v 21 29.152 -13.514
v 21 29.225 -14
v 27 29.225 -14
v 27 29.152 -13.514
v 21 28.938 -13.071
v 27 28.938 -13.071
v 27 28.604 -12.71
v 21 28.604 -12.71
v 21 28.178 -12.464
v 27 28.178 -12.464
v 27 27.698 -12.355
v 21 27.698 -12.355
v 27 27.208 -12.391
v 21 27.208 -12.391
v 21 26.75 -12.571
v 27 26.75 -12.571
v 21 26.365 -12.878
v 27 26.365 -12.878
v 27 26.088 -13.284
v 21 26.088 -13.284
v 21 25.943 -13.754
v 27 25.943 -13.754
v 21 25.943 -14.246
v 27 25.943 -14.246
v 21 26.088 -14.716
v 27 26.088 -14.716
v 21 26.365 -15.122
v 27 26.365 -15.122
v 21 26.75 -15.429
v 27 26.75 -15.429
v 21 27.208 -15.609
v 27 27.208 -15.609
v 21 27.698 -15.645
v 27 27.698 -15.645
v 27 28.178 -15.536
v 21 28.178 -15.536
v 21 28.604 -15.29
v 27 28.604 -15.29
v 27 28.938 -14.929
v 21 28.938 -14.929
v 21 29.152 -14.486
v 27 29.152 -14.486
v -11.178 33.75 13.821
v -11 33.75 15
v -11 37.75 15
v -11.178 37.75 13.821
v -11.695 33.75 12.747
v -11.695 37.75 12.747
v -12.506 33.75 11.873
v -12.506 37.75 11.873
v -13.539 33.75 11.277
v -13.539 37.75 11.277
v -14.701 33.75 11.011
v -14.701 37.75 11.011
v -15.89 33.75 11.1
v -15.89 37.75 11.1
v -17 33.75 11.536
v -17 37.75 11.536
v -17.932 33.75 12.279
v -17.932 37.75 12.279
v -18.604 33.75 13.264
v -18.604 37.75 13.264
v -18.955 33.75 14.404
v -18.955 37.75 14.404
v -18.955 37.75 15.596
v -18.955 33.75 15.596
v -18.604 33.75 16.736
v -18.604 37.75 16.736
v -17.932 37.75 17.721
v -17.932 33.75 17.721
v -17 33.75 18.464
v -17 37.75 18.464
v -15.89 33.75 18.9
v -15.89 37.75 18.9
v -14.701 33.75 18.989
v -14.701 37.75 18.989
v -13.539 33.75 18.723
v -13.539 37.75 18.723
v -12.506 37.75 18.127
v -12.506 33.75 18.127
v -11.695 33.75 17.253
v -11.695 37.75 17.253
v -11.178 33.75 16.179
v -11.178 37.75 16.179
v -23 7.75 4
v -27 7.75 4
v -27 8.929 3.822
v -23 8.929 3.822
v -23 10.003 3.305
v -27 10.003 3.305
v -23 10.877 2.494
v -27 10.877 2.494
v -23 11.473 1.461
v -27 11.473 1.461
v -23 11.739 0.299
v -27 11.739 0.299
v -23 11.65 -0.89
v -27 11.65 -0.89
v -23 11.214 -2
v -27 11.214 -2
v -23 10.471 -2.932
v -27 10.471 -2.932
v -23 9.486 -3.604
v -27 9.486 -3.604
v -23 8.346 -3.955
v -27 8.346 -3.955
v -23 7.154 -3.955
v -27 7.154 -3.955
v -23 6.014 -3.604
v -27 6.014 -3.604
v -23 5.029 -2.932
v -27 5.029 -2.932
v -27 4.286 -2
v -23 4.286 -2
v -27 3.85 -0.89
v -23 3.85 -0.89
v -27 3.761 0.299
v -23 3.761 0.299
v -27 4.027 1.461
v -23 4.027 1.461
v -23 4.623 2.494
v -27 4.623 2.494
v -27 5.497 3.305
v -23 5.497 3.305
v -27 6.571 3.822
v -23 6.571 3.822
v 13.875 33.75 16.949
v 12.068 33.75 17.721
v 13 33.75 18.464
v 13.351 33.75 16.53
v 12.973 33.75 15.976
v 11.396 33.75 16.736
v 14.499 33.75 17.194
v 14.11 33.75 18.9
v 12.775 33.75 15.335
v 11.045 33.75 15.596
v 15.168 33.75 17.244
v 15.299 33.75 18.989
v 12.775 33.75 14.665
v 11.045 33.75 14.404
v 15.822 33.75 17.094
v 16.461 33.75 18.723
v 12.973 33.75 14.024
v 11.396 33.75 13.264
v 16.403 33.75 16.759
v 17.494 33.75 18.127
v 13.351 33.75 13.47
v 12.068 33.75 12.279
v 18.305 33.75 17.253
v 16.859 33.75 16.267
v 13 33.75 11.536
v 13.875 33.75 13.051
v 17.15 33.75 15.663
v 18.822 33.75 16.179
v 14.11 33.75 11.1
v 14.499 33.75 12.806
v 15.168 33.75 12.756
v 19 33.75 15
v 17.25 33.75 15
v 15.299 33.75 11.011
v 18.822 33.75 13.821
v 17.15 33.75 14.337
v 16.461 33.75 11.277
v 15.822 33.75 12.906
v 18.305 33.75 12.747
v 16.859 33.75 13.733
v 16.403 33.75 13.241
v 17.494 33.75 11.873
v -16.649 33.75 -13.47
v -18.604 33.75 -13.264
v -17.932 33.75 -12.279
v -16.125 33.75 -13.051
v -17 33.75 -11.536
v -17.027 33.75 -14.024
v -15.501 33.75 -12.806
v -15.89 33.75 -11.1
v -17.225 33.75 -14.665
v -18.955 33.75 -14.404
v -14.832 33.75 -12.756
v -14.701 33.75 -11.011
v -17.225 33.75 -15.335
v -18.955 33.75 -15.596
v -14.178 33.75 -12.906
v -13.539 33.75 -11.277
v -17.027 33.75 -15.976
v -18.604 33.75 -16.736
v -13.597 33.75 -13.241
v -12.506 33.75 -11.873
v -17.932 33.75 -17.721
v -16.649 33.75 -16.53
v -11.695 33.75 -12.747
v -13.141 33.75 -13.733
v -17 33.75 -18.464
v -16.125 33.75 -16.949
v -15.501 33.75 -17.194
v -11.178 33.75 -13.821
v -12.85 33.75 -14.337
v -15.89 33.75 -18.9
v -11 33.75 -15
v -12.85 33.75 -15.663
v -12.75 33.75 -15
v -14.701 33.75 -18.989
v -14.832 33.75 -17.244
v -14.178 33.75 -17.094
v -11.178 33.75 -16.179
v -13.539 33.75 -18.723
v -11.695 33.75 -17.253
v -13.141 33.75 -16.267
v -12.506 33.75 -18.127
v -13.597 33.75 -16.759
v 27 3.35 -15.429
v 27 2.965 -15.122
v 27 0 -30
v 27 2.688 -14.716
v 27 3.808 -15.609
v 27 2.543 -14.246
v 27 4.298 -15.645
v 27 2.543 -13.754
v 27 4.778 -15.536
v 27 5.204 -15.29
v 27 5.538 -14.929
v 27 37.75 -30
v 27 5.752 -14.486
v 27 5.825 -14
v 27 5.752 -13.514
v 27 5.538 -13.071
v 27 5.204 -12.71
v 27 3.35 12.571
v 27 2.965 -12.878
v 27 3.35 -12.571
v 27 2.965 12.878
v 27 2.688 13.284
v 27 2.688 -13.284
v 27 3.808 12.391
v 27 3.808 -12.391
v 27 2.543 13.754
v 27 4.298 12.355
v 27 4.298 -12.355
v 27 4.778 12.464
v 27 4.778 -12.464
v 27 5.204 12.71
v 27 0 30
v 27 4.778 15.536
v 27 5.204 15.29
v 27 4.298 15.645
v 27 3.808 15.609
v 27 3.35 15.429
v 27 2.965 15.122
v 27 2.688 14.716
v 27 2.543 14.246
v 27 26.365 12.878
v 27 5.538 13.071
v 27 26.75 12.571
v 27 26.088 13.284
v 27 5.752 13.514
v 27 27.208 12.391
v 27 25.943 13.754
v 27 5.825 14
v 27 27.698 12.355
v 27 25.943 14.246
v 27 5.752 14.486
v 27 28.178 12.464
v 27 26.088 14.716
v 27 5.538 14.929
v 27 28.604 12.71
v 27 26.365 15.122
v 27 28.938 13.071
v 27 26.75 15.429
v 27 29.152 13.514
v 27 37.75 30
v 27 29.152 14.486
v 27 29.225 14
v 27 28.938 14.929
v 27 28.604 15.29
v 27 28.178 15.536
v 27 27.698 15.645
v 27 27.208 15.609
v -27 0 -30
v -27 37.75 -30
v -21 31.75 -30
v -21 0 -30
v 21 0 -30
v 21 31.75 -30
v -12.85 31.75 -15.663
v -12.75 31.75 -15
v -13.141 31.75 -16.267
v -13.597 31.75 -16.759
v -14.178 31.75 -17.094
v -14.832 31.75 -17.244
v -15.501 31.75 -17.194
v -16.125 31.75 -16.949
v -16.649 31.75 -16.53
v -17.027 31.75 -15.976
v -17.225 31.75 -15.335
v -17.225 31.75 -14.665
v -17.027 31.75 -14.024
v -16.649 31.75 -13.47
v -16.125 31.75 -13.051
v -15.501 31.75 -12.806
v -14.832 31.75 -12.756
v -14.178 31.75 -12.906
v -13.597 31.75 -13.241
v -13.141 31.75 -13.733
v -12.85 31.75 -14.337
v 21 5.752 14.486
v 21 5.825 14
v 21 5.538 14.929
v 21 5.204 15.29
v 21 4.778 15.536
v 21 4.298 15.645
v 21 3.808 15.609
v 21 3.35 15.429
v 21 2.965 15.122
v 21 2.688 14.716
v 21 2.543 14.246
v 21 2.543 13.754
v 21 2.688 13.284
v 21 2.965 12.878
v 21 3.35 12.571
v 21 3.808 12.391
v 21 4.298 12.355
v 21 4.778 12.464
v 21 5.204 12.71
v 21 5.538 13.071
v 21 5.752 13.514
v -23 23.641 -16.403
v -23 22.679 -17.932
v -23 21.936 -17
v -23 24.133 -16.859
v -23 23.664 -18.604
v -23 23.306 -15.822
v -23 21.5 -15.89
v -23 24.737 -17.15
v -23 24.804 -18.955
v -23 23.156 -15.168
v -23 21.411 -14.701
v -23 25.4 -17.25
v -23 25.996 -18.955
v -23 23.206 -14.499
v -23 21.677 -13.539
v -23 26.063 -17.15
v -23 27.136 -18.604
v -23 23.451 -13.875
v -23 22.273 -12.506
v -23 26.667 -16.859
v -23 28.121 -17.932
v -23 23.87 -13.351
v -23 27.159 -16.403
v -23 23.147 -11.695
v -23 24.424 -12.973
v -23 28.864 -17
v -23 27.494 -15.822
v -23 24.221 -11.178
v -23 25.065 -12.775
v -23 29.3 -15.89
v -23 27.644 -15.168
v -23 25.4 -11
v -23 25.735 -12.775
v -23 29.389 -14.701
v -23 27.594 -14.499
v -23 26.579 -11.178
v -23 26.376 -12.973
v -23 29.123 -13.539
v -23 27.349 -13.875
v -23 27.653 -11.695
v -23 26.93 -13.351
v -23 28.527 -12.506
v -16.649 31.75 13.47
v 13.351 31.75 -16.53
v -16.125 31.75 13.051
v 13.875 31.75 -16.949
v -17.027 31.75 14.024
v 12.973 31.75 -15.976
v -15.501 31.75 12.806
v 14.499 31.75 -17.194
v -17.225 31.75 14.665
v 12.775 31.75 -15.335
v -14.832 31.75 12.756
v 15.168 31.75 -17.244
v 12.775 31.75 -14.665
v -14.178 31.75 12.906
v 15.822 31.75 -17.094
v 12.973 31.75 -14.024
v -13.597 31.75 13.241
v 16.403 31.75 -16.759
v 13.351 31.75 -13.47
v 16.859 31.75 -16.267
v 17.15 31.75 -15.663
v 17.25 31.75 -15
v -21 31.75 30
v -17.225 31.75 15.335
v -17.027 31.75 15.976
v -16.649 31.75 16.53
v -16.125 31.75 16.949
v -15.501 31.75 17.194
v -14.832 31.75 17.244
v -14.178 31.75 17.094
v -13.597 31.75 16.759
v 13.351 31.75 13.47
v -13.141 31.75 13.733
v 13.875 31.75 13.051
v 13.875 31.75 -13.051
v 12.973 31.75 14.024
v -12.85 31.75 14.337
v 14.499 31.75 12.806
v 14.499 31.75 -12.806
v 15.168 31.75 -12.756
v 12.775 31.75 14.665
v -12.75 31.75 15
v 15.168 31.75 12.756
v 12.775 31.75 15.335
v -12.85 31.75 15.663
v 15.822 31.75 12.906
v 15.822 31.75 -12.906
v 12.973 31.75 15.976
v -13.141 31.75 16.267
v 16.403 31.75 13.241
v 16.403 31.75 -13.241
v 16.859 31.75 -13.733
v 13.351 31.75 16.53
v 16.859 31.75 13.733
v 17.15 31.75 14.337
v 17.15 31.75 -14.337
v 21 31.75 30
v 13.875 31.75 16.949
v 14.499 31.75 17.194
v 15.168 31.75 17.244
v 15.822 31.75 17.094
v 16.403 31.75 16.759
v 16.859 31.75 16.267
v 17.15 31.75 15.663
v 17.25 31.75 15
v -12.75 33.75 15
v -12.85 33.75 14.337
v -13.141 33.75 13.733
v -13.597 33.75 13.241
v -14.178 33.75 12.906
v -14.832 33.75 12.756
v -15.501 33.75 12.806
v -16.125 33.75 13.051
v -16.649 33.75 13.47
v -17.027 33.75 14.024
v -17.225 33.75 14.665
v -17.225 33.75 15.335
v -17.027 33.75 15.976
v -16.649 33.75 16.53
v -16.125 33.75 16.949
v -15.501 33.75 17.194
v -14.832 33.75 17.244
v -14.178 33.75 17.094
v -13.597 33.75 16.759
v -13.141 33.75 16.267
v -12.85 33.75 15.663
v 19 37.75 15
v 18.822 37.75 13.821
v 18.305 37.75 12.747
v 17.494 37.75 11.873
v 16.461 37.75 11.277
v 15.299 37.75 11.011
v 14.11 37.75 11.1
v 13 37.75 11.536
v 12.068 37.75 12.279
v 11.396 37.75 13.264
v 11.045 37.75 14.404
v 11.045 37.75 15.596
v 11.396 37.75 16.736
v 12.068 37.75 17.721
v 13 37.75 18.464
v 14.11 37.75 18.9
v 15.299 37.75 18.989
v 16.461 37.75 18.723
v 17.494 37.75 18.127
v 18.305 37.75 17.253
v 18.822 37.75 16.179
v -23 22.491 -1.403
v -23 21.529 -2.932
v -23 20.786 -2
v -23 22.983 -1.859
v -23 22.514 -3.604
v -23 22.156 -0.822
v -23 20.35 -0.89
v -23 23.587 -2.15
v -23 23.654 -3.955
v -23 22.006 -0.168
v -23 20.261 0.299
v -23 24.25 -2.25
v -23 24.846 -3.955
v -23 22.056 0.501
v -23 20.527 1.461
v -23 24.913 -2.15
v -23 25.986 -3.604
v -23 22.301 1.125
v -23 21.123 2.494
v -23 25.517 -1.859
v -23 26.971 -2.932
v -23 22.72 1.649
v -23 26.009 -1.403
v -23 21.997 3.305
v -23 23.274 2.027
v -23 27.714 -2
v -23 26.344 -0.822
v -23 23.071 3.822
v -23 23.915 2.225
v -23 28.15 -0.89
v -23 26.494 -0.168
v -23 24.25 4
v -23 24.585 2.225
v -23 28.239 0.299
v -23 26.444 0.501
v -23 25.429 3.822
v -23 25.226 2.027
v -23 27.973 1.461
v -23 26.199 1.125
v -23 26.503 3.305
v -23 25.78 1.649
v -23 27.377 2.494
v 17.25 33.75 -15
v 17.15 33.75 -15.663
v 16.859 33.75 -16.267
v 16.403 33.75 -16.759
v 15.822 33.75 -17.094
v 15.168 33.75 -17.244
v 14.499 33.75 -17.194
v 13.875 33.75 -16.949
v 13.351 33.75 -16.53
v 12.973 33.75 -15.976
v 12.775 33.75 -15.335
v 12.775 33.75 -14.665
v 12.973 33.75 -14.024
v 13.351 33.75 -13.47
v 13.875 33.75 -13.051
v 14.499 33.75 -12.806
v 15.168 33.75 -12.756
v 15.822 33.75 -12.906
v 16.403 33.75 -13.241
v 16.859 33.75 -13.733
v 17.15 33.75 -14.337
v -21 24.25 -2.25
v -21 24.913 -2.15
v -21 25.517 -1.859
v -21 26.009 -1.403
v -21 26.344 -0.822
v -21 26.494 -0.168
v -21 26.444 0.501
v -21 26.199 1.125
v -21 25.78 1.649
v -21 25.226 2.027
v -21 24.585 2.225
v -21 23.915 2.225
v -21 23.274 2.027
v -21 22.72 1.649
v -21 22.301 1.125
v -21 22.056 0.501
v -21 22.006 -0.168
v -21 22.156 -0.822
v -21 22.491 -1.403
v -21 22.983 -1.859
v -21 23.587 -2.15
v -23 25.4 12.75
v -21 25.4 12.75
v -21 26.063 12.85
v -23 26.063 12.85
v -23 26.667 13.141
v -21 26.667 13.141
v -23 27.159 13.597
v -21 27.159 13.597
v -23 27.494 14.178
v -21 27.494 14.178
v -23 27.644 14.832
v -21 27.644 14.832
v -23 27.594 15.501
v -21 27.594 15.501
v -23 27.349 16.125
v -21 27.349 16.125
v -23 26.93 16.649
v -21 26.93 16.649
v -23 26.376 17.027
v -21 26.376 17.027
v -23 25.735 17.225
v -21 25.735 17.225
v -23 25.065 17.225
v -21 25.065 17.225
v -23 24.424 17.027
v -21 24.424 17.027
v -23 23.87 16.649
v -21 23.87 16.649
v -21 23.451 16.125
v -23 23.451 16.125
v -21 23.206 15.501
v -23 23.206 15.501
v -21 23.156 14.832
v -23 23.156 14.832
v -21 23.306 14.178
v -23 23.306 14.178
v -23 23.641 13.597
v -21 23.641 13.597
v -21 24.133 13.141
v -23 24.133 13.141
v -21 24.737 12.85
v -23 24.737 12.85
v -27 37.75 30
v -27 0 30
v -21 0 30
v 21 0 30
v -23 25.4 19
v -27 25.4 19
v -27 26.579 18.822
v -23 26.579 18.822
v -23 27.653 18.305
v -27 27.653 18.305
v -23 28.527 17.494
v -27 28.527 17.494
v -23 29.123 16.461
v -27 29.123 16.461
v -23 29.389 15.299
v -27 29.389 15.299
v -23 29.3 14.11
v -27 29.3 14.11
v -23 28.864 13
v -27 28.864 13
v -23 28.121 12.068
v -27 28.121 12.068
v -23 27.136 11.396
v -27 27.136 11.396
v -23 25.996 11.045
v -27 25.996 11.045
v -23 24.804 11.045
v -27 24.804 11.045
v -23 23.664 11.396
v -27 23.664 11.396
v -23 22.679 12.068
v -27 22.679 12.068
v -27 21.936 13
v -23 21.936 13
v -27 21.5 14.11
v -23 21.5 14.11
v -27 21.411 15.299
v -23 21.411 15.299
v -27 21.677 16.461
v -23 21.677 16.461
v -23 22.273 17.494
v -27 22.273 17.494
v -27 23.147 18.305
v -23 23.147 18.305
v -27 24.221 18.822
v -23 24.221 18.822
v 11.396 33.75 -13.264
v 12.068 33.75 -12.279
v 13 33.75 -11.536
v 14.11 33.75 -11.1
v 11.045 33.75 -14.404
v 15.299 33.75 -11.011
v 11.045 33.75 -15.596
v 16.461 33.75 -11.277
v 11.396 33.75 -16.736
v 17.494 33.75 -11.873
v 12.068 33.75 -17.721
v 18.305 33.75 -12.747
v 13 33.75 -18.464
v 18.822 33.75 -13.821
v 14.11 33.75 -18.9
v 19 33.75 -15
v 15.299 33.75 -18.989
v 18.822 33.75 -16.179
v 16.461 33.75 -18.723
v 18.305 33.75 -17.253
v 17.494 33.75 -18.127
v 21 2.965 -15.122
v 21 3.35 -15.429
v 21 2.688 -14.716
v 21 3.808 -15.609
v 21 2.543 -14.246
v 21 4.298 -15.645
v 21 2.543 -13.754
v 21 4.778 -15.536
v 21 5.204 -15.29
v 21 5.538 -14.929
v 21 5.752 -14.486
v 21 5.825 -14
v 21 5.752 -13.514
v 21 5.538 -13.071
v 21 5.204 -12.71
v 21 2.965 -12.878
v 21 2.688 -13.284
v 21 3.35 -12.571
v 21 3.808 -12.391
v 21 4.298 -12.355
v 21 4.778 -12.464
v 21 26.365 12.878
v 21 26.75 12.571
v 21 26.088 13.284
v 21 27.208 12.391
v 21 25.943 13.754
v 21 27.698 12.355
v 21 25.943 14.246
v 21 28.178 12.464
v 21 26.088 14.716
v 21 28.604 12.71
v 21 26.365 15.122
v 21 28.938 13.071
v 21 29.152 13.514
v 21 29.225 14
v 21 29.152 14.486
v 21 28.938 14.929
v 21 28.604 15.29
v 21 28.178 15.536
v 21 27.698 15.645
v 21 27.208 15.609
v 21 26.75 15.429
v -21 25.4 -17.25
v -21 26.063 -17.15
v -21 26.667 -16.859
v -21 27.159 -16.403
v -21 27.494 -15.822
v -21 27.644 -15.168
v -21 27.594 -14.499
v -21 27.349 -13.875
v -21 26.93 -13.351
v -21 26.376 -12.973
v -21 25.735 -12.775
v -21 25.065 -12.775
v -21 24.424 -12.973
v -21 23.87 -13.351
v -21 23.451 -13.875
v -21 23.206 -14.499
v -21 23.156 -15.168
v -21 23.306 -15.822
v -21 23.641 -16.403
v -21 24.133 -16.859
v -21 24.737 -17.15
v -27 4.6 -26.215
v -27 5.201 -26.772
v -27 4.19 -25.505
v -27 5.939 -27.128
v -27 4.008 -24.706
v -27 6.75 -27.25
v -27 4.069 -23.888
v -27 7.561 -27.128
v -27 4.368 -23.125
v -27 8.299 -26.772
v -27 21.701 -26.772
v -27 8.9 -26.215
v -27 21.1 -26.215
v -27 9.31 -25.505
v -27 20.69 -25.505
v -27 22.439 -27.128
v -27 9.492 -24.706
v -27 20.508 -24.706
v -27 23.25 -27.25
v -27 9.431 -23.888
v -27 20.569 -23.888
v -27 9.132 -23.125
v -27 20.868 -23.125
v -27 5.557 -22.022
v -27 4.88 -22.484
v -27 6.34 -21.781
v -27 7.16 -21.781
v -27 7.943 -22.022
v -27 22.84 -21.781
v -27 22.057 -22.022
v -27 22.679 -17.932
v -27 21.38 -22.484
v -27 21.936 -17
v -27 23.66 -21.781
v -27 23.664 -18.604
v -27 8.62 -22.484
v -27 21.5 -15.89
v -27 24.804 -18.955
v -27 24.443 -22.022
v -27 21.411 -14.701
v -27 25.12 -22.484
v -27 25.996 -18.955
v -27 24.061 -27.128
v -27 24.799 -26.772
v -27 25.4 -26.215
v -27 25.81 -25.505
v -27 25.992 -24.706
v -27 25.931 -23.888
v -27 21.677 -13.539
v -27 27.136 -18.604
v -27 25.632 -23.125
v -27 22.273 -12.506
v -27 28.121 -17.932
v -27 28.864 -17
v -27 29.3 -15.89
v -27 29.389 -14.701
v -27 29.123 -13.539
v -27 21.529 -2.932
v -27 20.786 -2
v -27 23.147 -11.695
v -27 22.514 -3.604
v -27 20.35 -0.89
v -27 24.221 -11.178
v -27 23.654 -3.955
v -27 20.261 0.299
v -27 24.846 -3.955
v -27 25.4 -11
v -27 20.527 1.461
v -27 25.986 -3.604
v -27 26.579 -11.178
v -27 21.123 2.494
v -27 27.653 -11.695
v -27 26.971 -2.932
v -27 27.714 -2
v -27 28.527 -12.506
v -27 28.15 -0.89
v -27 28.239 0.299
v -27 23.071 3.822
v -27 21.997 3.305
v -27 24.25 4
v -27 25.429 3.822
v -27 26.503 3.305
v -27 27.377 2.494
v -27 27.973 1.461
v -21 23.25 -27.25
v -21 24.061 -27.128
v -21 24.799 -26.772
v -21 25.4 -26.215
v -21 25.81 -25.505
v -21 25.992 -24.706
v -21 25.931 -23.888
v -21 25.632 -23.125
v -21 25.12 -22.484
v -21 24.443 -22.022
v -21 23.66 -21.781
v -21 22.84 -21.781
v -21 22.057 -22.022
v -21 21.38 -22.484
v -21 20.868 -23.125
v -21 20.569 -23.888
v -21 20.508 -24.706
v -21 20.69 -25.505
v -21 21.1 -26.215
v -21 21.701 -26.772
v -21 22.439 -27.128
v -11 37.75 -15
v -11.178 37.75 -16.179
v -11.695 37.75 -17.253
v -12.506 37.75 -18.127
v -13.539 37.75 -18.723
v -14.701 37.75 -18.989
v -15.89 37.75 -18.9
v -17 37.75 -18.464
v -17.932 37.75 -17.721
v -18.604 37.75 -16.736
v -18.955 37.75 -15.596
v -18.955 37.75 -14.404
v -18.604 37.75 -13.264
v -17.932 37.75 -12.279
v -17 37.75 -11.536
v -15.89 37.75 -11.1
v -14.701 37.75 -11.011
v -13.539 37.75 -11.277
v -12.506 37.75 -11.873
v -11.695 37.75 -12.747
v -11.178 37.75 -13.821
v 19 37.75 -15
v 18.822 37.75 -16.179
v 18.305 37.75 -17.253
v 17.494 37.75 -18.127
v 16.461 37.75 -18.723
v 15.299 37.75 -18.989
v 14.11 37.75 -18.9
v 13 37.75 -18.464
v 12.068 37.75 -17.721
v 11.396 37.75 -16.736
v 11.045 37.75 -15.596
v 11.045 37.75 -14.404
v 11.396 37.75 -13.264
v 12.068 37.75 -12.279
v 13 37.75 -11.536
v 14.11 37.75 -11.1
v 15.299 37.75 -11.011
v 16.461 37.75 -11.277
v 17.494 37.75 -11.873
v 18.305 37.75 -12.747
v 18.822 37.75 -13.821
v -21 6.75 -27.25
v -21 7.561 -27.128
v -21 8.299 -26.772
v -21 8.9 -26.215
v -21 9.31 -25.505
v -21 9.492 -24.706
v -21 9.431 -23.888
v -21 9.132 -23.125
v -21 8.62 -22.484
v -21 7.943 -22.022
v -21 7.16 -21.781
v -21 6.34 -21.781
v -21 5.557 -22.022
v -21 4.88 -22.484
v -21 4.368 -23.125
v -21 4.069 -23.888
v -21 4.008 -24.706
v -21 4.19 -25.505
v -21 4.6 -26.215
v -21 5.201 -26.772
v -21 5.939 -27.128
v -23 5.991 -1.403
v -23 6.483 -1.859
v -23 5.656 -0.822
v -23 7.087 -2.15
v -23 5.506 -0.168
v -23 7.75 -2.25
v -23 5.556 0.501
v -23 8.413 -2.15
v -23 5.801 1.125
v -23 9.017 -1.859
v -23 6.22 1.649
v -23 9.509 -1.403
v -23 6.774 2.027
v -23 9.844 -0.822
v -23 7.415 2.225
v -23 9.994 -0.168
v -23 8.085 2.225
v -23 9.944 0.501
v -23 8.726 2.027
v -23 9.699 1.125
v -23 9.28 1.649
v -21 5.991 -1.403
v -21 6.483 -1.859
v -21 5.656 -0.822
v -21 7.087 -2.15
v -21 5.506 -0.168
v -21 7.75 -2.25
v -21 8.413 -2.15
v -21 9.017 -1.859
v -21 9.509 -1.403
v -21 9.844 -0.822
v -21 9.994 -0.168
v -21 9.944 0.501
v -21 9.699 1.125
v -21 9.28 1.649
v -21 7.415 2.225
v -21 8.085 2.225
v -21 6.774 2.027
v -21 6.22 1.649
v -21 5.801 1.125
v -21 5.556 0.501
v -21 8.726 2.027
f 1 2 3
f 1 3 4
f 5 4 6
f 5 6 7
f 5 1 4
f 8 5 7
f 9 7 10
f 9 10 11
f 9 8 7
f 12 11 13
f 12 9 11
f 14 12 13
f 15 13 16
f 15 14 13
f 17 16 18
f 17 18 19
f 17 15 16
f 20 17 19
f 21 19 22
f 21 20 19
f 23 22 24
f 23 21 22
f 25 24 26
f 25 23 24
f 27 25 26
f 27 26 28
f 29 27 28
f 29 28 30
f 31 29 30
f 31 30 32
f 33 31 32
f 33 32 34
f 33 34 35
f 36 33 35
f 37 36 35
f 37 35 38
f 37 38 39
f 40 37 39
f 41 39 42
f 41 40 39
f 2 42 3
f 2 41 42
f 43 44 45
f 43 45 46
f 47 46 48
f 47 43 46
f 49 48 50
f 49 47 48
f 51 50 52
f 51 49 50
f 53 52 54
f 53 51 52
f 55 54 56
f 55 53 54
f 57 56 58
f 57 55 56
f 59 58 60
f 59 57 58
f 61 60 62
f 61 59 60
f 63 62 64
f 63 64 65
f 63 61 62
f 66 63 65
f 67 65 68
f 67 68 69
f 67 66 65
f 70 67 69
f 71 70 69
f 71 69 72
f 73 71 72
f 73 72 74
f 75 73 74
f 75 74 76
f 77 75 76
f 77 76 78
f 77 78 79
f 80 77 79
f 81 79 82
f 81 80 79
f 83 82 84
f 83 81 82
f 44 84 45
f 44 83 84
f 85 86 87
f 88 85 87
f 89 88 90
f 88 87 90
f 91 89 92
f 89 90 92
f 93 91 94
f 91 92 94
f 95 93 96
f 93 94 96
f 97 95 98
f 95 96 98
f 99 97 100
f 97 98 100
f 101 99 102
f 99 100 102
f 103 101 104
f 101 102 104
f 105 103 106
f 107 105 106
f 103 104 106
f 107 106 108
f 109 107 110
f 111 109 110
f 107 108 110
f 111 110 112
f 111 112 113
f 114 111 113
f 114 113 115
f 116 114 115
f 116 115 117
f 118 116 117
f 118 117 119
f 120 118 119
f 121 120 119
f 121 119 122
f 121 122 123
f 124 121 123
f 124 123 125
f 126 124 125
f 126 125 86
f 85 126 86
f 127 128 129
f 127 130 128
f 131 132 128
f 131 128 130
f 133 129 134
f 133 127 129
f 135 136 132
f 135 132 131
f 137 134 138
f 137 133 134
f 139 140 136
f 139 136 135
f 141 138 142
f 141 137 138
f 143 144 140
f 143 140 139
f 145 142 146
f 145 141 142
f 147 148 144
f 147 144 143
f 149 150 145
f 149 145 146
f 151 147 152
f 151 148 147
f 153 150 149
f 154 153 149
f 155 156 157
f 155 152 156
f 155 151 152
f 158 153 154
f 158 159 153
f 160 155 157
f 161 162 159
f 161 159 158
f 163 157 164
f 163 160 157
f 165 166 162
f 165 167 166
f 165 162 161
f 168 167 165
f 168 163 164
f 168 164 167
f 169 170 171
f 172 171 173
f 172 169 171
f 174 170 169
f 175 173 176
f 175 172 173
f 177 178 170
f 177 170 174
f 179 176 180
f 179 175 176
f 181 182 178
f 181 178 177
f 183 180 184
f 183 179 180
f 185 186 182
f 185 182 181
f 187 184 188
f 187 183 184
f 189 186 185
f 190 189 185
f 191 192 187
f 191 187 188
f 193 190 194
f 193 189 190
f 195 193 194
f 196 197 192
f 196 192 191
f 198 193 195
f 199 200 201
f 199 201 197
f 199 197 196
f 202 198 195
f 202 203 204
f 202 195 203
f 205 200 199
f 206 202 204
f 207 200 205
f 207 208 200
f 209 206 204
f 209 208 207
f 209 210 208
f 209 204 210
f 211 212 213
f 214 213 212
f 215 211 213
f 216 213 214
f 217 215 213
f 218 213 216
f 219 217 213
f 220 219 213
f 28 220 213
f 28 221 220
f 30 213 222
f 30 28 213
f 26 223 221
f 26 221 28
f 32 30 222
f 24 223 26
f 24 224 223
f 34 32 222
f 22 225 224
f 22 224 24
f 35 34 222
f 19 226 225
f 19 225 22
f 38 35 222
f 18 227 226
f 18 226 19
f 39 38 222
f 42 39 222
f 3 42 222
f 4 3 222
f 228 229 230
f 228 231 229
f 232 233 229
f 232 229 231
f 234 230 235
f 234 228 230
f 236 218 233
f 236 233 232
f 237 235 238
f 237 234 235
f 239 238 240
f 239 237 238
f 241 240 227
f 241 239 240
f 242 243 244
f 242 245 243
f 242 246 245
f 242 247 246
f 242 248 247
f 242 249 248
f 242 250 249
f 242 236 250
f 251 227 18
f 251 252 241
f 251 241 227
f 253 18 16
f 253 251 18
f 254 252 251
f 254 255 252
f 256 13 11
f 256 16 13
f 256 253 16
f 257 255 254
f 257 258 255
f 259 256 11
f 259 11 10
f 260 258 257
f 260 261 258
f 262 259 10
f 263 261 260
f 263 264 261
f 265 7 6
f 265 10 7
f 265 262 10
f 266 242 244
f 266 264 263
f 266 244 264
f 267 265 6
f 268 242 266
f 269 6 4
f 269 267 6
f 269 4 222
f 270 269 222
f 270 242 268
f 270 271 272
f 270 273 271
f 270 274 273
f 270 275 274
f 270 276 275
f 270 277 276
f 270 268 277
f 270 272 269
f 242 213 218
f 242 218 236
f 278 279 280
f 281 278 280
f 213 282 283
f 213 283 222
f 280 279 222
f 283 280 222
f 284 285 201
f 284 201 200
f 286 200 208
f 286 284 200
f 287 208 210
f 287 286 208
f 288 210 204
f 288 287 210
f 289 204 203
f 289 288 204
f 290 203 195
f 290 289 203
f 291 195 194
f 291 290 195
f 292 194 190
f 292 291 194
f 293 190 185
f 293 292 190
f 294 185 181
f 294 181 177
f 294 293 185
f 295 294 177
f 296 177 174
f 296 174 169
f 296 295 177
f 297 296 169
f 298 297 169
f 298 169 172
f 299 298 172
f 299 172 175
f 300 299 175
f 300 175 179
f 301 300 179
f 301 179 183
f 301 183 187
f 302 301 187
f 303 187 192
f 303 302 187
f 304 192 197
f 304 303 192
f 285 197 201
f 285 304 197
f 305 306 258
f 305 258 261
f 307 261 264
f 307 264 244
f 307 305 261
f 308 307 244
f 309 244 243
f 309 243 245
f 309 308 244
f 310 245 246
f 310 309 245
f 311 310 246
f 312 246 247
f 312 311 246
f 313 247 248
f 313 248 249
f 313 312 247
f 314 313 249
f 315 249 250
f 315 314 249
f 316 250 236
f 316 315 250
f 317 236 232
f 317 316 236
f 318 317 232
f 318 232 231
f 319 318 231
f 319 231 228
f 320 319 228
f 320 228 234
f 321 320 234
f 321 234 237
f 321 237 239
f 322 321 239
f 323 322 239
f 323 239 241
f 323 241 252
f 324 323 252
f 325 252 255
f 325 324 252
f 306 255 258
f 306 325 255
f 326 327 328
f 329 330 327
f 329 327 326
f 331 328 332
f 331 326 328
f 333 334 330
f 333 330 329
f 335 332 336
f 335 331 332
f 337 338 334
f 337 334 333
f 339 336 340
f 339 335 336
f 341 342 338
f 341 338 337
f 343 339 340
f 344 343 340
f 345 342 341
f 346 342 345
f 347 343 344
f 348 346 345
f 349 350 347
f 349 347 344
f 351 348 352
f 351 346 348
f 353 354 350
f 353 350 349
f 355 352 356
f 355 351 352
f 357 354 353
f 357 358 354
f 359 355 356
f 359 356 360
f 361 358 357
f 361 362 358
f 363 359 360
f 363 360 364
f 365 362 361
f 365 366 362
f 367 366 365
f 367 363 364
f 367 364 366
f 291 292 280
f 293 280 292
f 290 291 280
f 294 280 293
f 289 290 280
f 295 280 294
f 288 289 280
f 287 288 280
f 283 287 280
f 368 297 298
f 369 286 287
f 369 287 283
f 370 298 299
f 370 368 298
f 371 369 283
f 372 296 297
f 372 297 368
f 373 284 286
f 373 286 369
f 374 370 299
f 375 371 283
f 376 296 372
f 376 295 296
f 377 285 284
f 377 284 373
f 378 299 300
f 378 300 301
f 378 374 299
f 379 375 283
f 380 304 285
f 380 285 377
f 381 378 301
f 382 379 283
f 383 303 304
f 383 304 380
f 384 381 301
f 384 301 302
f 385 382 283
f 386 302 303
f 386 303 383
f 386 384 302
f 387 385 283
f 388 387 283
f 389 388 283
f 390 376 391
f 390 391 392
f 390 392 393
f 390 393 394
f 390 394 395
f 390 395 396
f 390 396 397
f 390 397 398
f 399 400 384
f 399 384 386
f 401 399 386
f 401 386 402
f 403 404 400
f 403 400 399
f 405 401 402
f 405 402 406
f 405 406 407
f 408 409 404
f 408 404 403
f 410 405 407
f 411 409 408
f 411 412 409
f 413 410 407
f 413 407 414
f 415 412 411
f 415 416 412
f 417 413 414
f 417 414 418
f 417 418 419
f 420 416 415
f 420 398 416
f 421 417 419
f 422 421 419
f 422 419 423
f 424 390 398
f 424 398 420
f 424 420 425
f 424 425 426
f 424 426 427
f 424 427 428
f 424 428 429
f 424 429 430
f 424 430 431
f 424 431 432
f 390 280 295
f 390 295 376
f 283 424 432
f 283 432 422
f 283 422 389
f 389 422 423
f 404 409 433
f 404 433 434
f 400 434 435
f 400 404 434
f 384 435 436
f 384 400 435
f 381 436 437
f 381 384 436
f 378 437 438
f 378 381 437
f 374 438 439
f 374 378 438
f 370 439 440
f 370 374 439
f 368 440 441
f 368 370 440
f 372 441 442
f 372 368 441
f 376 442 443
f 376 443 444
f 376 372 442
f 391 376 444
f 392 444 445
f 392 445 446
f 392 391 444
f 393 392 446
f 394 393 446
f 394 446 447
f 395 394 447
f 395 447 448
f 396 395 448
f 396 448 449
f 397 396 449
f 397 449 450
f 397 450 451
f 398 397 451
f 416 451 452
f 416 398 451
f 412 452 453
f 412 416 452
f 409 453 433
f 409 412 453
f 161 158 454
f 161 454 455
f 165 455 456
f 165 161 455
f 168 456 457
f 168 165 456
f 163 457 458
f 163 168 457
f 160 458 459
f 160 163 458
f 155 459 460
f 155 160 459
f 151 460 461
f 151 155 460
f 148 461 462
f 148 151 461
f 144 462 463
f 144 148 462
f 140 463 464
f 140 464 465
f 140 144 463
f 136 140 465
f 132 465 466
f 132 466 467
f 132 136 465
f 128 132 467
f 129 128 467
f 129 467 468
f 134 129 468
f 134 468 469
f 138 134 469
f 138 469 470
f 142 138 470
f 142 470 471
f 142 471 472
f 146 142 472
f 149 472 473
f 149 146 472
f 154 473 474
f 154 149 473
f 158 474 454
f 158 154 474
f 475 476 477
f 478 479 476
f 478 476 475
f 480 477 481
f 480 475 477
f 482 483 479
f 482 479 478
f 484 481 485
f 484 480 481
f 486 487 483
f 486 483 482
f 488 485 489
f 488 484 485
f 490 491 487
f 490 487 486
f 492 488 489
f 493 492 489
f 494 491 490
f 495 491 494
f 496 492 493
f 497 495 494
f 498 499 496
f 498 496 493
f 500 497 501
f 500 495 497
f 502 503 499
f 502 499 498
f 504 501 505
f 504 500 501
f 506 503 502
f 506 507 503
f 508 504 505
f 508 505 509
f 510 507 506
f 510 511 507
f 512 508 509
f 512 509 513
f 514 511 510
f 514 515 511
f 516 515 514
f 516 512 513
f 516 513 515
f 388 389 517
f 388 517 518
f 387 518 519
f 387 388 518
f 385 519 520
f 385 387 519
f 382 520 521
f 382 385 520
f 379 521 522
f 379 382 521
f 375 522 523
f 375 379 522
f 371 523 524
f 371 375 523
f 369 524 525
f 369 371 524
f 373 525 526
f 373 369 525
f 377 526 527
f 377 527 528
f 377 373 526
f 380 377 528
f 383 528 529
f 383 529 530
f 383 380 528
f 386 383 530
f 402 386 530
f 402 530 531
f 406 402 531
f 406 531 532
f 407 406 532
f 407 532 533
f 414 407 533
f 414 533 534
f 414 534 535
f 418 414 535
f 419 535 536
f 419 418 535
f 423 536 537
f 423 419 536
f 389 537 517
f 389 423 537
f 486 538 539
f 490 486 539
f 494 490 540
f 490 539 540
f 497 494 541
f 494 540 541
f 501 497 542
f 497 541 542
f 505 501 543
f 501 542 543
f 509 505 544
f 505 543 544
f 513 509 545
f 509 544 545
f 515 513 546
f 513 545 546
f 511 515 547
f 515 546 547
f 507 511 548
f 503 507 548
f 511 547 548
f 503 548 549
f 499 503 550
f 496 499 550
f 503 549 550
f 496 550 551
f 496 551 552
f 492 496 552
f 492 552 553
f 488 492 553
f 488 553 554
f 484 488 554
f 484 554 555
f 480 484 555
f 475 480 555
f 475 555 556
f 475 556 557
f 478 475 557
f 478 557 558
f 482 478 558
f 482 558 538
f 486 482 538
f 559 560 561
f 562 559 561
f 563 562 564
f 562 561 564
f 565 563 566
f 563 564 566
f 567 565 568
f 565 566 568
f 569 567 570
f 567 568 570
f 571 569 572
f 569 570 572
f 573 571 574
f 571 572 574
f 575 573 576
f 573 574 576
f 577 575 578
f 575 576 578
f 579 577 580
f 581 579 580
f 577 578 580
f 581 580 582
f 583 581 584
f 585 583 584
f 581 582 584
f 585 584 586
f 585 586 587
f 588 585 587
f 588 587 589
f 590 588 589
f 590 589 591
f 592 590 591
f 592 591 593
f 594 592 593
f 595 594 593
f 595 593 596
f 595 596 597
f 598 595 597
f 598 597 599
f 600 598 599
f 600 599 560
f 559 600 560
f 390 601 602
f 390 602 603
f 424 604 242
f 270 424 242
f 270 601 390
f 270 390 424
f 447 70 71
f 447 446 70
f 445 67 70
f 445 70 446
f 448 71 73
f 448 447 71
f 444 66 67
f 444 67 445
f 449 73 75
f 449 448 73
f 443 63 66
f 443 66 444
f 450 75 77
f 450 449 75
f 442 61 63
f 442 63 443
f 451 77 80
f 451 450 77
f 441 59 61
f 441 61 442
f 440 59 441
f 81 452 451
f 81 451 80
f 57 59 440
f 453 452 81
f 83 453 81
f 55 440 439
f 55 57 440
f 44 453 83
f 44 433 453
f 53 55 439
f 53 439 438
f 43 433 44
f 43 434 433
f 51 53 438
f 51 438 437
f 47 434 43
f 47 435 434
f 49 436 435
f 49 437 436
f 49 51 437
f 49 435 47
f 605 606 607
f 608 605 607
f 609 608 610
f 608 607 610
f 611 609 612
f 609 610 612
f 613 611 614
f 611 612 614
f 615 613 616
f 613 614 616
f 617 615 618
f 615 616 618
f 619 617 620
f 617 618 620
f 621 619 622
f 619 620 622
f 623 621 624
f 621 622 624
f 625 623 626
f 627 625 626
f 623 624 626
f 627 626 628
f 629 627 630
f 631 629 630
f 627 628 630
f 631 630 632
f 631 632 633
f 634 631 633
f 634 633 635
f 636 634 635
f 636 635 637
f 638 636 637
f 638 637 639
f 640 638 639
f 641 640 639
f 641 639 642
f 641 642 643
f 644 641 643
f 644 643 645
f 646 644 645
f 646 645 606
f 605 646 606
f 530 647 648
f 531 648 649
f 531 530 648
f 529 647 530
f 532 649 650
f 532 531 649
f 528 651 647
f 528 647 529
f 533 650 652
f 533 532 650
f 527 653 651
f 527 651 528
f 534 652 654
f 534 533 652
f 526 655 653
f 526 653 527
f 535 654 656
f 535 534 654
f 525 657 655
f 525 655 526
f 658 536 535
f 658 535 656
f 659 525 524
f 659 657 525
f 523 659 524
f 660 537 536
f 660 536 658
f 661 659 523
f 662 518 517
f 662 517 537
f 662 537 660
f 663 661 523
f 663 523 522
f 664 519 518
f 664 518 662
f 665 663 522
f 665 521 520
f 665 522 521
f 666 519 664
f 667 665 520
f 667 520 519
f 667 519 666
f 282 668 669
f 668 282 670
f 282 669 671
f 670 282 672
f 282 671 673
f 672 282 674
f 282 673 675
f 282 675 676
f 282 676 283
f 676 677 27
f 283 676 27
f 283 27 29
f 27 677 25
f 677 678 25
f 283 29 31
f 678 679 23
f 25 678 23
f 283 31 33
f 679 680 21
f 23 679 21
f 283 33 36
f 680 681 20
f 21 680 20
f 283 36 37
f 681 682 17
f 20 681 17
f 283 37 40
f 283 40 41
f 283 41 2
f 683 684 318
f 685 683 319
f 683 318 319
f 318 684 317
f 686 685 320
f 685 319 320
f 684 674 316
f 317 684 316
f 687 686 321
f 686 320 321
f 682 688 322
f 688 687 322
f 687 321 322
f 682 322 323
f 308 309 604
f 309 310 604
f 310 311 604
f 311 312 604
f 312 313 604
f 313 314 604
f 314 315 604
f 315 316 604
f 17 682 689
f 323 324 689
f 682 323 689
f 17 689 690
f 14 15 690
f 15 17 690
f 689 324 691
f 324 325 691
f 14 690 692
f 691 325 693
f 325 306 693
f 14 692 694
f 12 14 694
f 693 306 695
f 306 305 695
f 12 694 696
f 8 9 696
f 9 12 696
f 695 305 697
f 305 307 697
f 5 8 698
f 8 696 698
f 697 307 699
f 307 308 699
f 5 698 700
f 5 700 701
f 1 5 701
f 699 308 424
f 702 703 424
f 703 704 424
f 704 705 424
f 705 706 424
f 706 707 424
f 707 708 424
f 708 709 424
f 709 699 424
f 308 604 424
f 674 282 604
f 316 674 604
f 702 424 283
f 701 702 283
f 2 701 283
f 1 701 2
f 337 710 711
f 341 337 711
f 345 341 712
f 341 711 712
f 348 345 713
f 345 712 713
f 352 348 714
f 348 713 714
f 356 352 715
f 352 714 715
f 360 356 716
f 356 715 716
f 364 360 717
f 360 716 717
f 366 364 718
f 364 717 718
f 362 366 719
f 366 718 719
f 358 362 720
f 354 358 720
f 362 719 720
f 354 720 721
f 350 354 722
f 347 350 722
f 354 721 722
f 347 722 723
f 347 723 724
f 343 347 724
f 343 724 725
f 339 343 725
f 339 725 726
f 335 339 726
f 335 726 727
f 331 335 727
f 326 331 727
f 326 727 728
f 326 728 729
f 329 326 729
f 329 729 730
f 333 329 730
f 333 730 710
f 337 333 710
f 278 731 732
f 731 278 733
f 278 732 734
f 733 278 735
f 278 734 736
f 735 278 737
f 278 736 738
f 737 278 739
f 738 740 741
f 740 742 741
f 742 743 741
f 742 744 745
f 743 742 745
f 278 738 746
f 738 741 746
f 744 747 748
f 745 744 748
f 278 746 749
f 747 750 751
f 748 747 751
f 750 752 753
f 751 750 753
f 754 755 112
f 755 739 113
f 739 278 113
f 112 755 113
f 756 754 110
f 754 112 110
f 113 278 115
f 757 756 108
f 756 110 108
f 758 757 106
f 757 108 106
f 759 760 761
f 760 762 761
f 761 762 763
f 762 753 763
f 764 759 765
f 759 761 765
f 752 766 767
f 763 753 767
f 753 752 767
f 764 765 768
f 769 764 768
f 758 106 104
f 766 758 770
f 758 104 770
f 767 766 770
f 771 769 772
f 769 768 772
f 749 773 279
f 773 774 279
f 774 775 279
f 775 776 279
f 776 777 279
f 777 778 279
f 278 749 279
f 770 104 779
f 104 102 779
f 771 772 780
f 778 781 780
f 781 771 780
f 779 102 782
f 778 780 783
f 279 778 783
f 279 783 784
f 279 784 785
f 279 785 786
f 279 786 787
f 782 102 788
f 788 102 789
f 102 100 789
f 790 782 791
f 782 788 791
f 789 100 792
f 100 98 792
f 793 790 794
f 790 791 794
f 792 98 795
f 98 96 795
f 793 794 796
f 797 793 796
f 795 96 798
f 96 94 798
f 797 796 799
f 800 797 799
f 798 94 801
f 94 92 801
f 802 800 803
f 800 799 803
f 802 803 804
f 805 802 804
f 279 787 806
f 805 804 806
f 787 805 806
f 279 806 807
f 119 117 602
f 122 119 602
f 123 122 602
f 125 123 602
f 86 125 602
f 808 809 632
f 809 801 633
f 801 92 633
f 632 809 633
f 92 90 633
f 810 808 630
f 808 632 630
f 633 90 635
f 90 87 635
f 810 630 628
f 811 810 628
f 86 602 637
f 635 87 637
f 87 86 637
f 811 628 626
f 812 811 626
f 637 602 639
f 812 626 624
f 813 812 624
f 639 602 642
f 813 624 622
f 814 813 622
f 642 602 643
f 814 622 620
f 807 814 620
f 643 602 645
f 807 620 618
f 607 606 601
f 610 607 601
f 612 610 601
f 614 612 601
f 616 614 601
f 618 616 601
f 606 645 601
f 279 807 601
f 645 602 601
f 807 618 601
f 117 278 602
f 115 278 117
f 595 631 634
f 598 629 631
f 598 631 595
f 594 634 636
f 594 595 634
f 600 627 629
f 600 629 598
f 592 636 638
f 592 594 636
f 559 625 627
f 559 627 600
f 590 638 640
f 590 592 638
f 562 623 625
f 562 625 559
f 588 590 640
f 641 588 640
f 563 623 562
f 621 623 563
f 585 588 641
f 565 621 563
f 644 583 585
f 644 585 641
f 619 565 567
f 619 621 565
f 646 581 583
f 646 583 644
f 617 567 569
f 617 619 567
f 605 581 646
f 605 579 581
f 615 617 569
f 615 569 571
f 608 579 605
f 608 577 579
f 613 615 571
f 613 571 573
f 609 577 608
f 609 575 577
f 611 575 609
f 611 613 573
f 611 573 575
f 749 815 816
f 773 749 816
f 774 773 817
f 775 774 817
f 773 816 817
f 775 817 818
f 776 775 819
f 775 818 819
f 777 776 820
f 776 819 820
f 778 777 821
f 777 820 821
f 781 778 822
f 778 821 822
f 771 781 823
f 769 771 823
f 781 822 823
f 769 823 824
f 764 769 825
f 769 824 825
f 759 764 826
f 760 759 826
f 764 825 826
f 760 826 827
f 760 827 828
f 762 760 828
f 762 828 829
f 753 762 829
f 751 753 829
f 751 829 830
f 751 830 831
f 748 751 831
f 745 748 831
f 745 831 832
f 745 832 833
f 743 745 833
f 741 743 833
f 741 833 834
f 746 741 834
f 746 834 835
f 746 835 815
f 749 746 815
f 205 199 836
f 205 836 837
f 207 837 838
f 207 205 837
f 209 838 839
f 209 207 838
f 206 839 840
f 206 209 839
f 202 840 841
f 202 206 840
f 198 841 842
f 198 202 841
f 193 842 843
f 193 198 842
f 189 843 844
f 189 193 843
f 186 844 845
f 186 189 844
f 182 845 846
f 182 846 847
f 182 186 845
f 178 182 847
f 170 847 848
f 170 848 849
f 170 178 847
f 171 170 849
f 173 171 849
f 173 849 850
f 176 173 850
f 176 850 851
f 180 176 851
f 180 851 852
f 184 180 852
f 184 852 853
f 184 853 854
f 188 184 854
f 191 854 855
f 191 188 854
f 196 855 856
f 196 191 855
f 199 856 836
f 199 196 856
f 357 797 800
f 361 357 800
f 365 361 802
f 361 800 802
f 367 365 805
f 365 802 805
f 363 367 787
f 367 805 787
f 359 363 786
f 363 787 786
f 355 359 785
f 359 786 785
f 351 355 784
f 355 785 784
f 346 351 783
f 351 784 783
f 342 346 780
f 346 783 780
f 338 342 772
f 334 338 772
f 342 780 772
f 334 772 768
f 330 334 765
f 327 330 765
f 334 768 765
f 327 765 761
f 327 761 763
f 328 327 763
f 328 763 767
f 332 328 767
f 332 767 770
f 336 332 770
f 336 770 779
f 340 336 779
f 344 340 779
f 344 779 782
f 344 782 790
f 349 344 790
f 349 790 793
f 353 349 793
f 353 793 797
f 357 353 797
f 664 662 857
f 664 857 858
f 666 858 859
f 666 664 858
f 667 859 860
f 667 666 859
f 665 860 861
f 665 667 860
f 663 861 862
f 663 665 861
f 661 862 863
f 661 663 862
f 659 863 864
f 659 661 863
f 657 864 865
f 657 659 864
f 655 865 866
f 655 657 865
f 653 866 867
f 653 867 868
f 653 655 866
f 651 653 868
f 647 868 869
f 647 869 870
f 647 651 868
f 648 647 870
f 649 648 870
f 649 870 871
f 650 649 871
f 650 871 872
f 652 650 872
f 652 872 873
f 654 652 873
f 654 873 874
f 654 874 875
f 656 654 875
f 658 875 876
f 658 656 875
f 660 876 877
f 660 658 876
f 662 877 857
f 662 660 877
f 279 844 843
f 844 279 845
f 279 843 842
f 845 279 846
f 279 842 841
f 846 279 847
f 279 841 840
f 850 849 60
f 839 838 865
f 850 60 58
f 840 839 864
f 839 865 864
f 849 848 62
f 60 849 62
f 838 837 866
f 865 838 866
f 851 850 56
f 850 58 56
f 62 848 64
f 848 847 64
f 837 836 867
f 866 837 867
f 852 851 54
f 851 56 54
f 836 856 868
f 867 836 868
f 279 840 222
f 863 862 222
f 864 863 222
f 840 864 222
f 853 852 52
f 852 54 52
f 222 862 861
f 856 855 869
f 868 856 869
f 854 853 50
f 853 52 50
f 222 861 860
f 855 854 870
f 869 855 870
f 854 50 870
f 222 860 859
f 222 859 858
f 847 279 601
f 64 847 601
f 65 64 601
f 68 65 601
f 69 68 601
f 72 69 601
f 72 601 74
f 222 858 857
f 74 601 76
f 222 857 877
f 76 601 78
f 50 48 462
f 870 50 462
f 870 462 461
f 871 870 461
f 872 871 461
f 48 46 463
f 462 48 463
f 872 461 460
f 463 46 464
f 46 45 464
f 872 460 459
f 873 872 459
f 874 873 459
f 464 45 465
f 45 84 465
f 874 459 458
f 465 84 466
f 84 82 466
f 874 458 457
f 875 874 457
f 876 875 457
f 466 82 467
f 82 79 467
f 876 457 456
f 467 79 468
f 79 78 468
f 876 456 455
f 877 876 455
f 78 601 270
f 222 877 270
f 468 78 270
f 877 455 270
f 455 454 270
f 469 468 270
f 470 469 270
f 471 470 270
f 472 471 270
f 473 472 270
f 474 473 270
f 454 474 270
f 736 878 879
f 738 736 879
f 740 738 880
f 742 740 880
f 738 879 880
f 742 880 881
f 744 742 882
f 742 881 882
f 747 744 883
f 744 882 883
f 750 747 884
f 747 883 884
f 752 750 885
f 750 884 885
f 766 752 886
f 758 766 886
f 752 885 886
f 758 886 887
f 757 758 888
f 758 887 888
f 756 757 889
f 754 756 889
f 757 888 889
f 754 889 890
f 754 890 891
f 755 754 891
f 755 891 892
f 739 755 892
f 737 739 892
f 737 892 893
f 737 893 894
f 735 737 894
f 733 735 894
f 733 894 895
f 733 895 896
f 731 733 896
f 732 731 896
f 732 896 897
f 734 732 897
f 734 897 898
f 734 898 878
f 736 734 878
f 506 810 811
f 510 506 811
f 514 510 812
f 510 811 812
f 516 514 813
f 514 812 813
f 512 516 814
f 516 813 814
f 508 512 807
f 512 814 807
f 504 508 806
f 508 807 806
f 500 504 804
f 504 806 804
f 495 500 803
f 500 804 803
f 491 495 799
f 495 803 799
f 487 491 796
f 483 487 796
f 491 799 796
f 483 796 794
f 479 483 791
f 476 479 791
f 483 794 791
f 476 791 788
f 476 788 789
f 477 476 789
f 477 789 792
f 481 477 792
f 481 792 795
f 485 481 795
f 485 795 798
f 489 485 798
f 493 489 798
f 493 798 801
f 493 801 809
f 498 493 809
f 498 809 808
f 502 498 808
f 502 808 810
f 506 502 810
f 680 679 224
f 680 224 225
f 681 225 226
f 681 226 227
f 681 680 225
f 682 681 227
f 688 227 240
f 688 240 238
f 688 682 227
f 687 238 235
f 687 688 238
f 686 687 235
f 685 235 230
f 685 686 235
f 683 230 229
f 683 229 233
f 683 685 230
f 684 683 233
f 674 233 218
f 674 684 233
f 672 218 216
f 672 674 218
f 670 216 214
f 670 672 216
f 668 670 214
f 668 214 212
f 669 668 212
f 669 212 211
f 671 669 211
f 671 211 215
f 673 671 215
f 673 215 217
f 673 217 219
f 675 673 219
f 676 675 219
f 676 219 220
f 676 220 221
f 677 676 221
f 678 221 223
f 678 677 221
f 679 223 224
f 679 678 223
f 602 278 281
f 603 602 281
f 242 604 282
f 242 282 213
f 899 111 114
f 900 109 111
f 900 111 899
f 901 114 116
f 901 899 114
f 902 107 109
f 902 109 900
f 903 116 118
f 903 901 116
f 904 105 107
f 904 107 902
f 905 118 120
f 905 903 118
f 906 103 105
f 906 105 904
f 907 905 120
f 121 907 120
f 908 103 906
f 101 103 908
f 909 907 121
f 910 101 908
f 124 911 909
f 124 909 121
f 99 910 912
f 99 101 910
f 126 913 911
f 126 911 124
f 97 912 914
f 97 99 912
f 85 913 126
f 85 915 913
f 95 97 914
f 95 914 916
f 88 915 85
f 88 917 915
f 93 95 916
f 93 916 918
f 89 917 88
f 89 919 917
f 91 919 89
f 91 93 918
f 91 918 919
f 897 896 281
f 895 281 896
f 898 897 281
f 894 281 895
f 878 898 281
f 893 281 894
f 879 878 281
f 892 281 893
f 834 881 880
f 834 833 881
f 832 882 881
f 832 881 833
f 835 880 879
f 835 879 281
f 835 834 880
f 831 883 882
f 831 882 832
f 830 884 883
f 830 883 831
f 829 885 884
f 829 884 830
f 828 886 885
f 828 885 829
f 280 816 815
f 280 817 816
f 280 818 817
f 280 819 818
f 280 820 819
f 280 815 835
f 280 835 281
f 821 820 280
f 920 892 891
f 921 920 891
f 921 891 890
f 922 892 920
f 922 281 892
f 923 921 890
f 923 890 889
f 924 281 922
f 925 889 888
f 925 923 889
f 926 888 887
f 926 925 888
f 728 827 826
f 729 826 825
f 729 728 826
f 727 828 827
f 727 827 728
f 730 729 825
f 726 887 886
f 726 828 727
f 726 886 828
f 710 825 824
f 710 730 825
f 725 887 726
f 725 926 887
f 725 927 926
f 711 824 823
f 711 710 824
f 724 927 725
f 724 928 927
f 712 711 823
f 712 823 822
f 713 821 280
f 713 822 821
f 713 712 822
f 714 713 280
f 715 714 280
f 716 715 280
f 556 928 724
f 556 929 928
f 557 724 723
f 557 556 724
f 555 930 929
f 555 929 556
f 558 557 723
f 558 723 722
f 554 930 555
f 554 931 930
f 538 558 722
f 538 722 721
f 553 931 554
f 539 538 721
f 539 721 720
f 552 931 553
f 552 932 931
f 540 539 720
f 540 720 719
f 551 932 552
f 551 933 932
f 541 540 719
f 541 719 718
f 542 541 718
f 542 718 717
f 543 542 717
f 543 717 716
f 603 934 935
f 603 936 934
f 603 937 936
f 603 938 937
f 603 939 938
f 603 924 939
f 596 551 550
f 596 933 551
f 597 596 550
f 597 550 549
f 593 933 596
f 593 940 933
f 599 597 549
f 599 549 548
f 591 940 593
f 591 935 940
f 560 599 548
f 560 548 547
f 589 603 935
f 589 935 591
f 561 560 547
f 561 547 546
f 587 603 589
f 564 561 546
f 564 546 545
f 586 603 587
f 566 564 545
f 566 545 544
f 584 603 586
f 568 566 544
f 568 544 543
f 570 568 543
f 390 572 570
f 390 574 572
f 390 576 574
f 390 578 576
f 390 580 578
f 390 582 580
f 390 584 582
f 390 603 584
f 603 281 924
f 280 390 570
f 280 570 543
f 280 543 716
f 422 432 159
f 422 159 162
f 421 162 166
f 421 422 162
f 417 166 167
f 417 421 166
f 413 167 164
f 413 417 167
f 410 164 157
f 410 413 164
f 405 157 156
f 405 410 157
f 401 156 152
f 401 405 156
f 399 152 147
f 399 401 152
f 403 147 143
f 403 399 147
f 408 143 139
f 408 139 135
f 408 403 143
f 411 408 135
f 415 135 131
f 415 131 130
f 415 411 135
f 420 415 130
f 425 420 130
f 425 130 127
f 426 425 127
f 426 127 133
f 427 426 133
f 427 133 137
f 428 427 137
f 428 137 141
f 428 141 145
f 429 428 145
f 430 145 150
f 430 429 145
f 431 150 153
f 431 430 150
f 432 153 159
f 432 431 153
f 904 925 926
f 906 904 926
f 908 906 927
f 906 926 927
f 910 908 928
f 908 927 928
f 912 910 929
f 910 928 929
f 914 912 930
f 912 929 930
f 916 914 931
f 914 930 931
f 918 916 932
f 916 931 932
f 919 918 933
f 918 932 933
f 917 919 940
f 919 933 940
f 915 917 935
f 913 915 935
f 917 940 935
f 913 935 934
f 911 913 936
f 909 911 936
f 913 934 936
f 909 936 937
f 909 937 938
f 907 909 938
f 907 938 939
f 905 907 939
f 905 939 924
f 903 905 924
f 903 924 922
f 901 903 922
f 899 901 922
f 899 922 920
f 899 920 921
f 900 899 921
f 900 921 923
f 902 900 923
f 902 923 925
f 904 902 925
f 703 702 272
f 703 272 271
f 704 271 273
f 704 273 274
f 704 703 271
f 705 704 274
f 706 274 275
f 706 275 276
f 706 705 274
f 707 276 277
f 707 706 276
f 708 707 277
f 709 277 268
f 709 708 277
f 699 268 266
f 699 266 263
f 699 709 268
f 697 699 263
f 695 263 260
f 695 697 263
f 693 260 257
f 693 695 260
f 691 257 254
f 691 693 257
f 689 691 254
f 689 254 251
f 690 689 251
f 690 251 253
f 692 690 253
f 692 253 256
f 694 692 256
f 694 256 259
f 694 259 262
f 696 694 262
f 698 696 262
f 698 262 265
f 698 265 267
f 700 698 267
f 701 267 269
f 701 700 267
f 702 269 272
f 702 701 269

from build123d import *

# Parameters (mm, degrees)
SKETCH1_W                      = 54
SKETCH1_H                      = 37.75
BOSS_EXTRUDE1_DEPTH            = 30
SKETCH2_W                      = 42
SKETCH2_H                      = 31.75
CUT_EXTRUDE1_DEPTH             = 76.855537042
CBORE_FOR_M4_SHCS1_D           = 4.5
CBORE_FOR_M4_SHCS1_DEPTH       = 6
CBORE_FOR_M4_SHCS1_CBORE_D     = 8
CBORE_FOR_M4_SHCS1_CBORE_DEPTH = 4
M5_CLEARANCE_HOLE1_D           = 5.5
M5_CLEARANCE_HOLE1_DEPTH       = 6
CBORE_START                    = 33.75
CBORE_FOR_M4_SHCS2_OUTLINE_R   = 4
CBORE_FOR_M4_SHCS2_DEPTH       = 4
CBORE_START_2                  = 31.75
CBORE_FOR_M4_SHCS2_2_OUTLINE_R = 2.25
CBORE_FOR_M4_SHCS2_2_DEPTH     = 2
M4X0_7_START                   = 21
M4X0_7_TAPPED_HOLE1_OUTLINE_R  = 1.65
M4X0_7_TAPPED_HOLE1_DEPTH      = 6


# Read off the part's stored shape, not the designer's step: CBORE for M4 SHCS2, M4x0.7 Tapped Hole1
with BuildPart() as part:
    # Sketch1 → Boss-Extrude1 (new, symmetric)
    with BuildSketch(Plane.XY):
        with Locations((0, 18.875)):
            Rectangle(SKETCH1_W, SKETCH1_H)
    extrude(amount=BOSS_EXTRUDE1_DEPTH, both=True)

    # Sketch2 → Cut-Extrude1 (cut, through all)
    with BuildSketch(Plane.XY.offset(30)):
        with Locations((0, 15.875)):
            Rectangle(SKETCH2_W, SKETCH2_H)
    extrude(amount=-CUT_EXTRUDE1_DEPTH, mode=Mode.SUBTRACT)

    # CBORE for M4 SHCS1
    with Locations(Plane.ZY.offset(27)):
        with Locations((15, 25.4), (0, 24.25), (0, 7.75), (-15, 25.4)):
            CounterBoreHole(CBORE_FOR_M4_SHCS1_D / 2, CBORE_FOR_M4_SHCS1_CBORE_D / 2, CBORE_FOR_M4_SHCS1_CBORE_DEPTH, depth=CBORE_FOR_M4_SHCS1_DEPTH)

    # M5 Clearance Hole1
    with Locations(Plane.ZY.offset(27)):
        with Locations((-24.5, 23.25), (-24.5, 6.75)):
            Hole(M5_CLEARANCE_HOLE1_D / 2, depth=M5_CLEARANCE_HOLE1_DEPTH)

    # CBORE for M4 SHCS2 outline → CBORE for M4 SHCS2 (cut)
    with BuildSketch(Plane(origin=(0, 0, 0), x_dir=(1, 0, 0), z_dir=(0, 1, 0)).offset(CBORE_START)):
        with Locations((15, 15)):
            Circle(CBORE_FOR_M4_SHCS2_OUTLINE_R)
        with Locations((-15, -15)):
            Circle(CBORE_FOR_M4_SHCS2_OUTLINE_R)
        with Locations((-15, 15)):
            Circle(CBORE_FOR_M4_SHCS2_OUTLINE_R)
        with Locations((15, -15)):
            Circle(CBORE_FOR_M4_SHCS2_OUTLINE_R)
    extrude(amount=CBORE_FOR_M4_SHCS2_DEPTH, mode=Mode.SUBTRACT)

    # CBORE for M4 SHCS2 2 outline → CBORE for M4 SHCS2 2 (cut)
    with BuildSketch(Plane(origin=(0, 0, 0), x_dir=(1, 0, 0), z_dir=(0, 1, 0)).offset(CBORE_START_2)):
        with Locations((15, 15)):
            Circle(CBORE_FOR_M4_SHCS2_2_OUTLINE_R)
        with Locations((-15, -15)):
            Circle(CBORE_FOR_M4_SHCS2_2_OUTLINE_R)
        with Locations((-15, 15)):
            Circle(CBORE_FOR_M4_SHCS2_2_OUTLINE_R)
        with Locations((15, -15)):
            Circle(CBORE_FOR_M4_SHCS2_2_OUTLINE_R)
    extrude(amount=CBORE_FOR_M4_SHCS2_2_DEPTH, mode=Mode.SUBTRACT)

    # M4x0.7 Tapped Hole1 outline → M4x0.7 Tapped Hole1 (cut)
    with BuildSketch(Plane.YZ.offset(M4X0_7_START)):
        with Locations((27.575, 14)):
            Circle(M4X0_7_TAPPED_HOLE1_OUTLINE_R)
        with Locations((4.175, -14)):
            Circle(M4X0_7_TAPPED_HOLE1_OUTLINE_R)
        with Locations((27.575, -14)):
            Circle(M4X0_7_TAPPED_HOLE1_OUTLINE_R)
        with Locations((4.175, 14)):
            Circle(M4X0_7_TAPPED_HOLE1_OUTLINE_R)
    extrude(amount=M4X0_7_TAPPED_HOLE1_DEPTH, mode=Mode.SUBTRACT)


solid = part.part
